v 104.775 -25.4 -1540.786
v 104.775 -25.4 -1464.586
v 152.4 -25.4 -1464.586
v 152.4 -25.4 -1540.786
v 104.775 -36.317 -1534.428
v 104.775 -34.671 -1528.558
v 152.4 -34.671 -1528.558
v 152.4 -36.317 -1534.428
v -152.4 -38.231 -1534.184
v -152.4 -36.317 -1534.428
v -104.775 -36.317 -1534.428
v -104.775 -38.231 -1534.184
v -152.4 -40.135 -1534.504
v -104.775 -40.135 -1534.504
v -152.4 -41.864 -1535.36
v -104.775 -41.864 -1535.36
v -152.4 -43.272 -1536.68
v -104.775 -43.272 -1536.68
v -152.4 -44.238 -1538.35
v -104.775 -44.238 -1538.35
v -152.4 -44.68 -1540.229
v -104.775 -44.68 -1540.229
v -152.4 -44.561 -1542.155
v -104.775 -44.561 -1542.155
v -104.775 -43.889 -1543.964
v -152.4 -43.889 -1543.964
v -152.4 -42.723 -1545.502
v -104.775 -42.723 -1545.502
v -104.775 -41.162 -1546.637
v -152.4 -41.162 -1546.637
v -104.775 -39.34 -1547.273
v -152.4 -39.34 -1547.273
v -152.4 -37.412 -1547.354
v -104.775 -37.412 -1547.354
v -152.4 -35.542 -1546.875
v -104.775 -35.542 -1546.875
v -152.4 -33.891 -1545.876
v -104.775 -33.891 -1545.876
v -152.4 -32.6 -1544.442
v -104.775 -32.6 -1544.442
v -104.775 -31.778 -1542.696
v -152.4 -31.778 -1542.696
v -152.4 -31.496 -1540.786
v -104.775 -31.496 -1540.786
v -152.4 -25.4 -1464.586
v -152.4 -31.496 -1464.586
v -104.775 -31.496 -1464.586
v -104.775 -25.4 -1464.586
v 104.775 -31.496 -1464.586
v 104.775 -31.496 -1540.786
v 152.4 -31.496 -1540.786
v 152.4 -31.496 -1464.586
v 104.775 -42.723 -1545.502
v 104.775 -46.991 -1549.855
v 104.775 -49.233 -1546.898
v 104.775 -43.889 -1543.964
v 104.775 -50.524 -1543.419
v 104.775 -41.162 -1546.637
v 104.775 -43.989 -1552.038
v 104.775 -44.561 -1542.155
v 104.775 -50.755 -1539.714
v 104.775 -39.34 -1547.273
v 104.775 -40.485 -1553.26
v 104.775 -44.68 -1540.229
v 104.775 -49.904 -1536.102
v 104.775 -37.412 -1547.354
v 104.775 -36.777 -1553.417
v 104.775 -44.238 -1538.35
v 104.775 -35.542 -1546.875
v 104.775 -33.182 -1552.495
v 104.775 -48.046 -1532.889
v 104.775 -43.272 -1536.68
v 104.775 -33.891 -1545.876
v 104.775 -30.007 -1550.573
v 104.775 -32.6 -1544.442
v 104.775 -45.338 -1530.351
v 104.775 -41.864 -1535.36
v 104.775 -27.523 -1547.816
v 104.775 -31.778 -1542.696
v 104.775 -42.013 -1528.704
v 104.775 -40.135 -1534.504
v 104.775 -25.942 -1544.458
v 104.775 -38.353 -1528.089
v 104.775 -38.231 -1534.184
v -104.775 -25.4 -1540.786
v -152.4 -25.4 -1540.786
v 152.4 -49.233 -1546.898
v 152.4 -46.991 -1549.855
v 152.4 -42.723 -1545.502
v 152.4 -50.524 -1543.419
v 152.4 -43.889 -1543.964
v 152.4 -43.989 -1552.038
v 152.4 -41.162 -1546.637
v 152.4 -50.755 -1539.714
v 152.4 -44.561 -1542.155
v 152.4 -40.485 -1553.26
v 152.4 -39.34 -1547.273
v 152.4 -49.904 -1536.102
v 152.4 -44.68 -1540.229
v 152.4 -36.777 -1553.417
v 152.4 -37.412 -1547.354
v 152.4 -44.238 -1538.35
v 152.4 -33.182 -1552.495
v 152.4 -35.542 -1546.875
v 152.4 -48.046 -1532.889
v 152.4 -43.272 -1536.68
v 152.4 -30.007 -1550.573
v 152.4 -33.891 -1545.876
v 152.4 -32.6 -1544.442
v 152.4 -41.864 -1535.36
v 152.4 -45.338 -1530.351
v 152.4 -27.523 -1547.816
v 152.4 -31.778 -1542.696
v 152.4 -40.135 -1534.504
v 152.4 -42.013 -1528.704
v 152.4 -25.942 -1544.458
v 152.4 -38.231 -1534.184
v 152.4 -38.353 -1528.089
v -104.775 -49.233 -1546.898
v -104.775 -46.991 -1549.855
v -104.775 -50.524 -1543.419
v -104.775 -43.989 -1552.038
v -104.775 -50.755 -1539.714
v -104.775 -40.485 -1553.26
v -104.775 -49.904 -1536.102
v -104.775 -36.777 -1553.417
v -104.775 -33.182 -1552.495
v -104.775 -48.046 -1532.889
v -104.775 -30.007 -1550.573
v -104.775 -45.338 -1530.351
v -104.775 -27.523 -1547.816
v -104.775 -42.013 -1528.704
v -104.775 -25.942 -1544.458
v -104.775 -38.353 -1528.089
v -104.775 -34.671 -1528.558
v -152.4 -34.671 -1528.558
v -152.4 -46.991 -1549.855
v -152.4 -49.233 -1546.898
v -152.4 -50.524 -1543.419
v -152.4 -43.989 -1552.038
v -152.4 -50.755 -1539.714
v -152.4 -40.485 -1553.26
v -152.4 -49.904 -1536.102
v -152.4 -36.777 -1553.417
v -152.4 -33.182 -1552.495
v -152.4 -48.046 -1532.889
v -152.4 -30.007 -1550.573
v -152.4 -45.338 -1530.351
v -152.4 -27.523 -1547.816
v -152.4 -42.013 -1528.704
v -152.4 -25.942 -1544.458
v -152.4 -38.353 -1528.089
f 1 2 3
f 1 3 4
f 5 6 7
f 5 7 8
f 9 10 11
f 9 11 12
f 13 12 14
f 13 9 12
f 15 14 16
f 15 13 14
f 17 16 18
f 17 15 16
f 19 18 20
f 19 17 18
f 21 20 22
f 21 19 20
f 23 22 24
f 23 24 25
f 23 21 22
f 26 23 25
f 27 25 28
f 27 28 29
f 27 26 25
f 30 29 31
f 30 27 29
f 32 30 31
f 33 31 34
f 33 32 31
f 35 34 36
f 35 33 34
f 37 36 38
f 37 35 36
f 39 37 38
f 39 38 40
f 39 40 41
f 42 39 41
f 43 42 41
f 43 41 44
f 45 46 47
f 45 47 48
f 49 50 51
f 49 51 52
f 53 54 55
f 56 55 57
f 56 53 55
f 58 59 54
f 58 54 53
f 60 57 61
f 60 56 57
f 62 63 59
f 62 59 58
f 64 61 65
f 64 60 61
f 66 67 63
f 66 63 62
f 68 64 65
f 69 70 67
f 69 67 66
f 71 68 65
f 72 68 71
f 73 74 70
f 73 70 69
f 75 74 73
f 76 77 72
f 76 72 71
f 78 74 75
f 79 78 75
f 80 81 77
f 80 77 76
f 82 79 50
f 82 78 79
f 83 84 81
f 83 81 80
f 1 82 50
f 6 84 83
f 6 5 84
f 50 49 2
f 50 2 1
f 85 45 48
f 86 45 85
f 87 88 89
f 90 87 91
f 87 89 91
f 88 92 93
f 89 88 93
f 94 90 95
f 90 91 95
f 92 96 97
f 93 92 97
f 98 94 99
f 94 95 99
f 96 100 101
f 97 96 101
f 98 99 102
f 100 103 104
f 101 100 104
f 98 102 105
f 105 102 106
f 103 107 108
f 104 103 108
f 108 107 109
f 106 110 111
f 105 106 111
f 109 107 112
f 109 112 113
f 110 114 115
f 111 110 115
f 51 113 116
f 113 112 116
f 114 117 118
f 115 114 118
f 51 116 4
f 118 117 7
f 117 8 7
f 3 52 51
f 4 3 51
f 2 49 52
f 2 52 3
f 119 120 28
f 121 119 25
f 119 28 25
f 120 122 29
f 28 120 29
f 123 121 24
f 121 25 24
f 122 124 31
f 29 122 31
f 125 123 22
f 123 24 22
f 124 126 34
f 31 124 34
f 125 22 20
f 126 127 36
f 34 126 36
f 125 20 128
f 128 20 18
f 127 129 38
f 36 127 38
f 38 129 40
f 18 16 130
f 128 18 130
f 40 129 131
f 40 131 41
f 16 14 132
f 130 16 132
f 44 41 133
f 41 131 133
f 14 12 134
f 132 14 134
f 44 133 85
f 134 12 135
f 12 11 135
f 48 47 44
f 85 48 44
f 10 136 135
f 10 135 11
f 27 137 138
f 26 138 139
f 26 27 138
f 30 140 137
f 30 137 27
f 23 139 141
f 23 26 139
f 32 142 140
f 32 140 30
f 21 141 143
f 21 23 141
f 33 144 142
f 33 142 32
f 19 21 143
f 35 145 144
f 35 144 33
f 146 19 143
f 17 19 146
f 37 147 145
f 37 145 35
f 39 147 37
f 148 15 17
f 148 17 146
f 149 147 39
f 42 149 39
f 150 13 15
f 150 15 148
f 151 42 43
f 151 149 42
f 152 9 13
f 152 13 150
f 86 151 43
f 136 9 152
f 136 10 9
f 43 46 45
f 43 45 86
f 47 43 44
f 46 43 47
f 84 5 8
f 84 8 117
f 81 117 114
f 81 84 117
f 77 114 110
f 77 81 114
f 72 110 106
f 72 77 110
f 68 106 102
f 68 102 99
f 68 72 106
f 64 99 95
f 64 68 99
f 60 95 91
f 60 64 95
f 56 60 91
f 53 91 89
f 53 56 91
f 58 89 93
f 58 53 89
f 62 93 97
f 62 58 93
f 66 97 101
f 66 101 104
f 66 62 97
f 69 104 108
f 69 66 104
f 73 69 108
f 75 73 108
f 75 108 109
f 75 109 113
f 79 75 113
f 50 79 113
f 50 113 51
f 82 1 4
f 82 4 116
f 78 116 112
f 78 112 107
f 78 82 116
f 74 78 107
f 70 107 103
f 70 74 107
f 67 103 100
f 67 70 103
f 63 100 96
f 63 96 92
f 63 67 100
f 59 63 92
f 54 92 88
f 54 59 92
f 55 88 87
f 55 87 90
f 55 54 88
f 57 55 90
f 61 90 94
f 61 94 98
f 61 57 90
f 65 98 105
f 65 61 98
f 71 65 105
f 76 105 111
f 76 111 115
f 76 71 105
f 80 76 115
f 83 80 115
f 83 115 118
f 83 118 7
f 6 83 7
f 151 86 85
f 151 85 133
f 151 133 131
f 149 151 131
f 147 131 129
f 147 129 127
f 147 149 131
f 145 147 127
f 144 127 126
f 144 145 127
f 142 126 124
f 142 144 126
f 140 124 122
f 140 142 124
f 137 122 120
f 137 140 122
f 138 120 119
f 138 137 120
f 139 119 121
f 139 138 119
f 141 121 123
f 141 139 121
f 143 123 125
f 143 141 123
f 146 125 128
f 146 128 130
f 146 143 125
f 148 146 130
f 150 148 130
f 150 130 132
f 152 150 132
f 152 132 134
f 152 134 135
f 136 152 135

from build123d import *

# Parameters (mm, degrees)
BOSS_EXTRUDE1_START = 104.775
BOSS_EXTRUDE1_DEPTH = 47.625
BOSS_EXTRUDE2_START = -152.4
BOSS_EXTRUDE2_DEPTH = 47.625


with BuildPart() as part:
    # Sketch1 → Boss-Extrude1 (new body)
    with BuildSketch(Plane(origin=(0, 0, 0), x_dir=(0, 0, -1), z_dir=(1, 0, 0)).offset(BOSS_EXTRUDE1_START)):
        with BuildLine():
            Line((1540.78633762, -31.496), (1464.58633762, -31.496))
            Line((1464.58633762, -31.496), (1464.58633762, -25.4))
            Line((1464.58633762, -25.4), (1540.78633762, -25.4))
            ThreePointArc((1540.78633762, -25.4), (1548.459071813, -48.220234681), (1528.558011528, -34.671))
            Line((1528.558011528, -34.671), (1534.427608052, -36.31692))
            ThreePointArc((1534.427608052, -36.31692), (1544.7761594, -43.362522034), (1540.78633762, -31.496))
        make_face()
    extrude(amount=BOSS_EXTRUDE1_DEPTH)


with BuildPart() as body_2:
    # Sketch1<2> → Boss-Extrude2 (new body)
    with BuildSketch(Plane(origin=(0, 0, 0), x_dir=(0, 0, -1), z_dir=(1, 0, 0)).offset(BOSS_EXTRUDE2_START)):
        with BuildLine():
            Line((1540.78633762, -31.496), (1464.58633762, -31.496))
            Line((1464.58633762, -31.496), (1464.58633762, -25.4))
            Line((1464.58633762, -25.4), (1540.78633762, -25.4))
            ThreePointArc((1540.78633762, -25.4), (1548.459071813, -48.220234681), (1528.558011528, -34.671))
            Line((1528.558011528, -34.671), (1534.427608052, -36.31692))
            ThreePointArc((1534.427608052, -36.31692), (1544.7761594, -43.362522034), (1540.78633762, -31.496))
        make_face()
    extrude(amount=BOSS_EXTRUDE2_DEPTH)


solid = Compound([part.part, body_2.part])
